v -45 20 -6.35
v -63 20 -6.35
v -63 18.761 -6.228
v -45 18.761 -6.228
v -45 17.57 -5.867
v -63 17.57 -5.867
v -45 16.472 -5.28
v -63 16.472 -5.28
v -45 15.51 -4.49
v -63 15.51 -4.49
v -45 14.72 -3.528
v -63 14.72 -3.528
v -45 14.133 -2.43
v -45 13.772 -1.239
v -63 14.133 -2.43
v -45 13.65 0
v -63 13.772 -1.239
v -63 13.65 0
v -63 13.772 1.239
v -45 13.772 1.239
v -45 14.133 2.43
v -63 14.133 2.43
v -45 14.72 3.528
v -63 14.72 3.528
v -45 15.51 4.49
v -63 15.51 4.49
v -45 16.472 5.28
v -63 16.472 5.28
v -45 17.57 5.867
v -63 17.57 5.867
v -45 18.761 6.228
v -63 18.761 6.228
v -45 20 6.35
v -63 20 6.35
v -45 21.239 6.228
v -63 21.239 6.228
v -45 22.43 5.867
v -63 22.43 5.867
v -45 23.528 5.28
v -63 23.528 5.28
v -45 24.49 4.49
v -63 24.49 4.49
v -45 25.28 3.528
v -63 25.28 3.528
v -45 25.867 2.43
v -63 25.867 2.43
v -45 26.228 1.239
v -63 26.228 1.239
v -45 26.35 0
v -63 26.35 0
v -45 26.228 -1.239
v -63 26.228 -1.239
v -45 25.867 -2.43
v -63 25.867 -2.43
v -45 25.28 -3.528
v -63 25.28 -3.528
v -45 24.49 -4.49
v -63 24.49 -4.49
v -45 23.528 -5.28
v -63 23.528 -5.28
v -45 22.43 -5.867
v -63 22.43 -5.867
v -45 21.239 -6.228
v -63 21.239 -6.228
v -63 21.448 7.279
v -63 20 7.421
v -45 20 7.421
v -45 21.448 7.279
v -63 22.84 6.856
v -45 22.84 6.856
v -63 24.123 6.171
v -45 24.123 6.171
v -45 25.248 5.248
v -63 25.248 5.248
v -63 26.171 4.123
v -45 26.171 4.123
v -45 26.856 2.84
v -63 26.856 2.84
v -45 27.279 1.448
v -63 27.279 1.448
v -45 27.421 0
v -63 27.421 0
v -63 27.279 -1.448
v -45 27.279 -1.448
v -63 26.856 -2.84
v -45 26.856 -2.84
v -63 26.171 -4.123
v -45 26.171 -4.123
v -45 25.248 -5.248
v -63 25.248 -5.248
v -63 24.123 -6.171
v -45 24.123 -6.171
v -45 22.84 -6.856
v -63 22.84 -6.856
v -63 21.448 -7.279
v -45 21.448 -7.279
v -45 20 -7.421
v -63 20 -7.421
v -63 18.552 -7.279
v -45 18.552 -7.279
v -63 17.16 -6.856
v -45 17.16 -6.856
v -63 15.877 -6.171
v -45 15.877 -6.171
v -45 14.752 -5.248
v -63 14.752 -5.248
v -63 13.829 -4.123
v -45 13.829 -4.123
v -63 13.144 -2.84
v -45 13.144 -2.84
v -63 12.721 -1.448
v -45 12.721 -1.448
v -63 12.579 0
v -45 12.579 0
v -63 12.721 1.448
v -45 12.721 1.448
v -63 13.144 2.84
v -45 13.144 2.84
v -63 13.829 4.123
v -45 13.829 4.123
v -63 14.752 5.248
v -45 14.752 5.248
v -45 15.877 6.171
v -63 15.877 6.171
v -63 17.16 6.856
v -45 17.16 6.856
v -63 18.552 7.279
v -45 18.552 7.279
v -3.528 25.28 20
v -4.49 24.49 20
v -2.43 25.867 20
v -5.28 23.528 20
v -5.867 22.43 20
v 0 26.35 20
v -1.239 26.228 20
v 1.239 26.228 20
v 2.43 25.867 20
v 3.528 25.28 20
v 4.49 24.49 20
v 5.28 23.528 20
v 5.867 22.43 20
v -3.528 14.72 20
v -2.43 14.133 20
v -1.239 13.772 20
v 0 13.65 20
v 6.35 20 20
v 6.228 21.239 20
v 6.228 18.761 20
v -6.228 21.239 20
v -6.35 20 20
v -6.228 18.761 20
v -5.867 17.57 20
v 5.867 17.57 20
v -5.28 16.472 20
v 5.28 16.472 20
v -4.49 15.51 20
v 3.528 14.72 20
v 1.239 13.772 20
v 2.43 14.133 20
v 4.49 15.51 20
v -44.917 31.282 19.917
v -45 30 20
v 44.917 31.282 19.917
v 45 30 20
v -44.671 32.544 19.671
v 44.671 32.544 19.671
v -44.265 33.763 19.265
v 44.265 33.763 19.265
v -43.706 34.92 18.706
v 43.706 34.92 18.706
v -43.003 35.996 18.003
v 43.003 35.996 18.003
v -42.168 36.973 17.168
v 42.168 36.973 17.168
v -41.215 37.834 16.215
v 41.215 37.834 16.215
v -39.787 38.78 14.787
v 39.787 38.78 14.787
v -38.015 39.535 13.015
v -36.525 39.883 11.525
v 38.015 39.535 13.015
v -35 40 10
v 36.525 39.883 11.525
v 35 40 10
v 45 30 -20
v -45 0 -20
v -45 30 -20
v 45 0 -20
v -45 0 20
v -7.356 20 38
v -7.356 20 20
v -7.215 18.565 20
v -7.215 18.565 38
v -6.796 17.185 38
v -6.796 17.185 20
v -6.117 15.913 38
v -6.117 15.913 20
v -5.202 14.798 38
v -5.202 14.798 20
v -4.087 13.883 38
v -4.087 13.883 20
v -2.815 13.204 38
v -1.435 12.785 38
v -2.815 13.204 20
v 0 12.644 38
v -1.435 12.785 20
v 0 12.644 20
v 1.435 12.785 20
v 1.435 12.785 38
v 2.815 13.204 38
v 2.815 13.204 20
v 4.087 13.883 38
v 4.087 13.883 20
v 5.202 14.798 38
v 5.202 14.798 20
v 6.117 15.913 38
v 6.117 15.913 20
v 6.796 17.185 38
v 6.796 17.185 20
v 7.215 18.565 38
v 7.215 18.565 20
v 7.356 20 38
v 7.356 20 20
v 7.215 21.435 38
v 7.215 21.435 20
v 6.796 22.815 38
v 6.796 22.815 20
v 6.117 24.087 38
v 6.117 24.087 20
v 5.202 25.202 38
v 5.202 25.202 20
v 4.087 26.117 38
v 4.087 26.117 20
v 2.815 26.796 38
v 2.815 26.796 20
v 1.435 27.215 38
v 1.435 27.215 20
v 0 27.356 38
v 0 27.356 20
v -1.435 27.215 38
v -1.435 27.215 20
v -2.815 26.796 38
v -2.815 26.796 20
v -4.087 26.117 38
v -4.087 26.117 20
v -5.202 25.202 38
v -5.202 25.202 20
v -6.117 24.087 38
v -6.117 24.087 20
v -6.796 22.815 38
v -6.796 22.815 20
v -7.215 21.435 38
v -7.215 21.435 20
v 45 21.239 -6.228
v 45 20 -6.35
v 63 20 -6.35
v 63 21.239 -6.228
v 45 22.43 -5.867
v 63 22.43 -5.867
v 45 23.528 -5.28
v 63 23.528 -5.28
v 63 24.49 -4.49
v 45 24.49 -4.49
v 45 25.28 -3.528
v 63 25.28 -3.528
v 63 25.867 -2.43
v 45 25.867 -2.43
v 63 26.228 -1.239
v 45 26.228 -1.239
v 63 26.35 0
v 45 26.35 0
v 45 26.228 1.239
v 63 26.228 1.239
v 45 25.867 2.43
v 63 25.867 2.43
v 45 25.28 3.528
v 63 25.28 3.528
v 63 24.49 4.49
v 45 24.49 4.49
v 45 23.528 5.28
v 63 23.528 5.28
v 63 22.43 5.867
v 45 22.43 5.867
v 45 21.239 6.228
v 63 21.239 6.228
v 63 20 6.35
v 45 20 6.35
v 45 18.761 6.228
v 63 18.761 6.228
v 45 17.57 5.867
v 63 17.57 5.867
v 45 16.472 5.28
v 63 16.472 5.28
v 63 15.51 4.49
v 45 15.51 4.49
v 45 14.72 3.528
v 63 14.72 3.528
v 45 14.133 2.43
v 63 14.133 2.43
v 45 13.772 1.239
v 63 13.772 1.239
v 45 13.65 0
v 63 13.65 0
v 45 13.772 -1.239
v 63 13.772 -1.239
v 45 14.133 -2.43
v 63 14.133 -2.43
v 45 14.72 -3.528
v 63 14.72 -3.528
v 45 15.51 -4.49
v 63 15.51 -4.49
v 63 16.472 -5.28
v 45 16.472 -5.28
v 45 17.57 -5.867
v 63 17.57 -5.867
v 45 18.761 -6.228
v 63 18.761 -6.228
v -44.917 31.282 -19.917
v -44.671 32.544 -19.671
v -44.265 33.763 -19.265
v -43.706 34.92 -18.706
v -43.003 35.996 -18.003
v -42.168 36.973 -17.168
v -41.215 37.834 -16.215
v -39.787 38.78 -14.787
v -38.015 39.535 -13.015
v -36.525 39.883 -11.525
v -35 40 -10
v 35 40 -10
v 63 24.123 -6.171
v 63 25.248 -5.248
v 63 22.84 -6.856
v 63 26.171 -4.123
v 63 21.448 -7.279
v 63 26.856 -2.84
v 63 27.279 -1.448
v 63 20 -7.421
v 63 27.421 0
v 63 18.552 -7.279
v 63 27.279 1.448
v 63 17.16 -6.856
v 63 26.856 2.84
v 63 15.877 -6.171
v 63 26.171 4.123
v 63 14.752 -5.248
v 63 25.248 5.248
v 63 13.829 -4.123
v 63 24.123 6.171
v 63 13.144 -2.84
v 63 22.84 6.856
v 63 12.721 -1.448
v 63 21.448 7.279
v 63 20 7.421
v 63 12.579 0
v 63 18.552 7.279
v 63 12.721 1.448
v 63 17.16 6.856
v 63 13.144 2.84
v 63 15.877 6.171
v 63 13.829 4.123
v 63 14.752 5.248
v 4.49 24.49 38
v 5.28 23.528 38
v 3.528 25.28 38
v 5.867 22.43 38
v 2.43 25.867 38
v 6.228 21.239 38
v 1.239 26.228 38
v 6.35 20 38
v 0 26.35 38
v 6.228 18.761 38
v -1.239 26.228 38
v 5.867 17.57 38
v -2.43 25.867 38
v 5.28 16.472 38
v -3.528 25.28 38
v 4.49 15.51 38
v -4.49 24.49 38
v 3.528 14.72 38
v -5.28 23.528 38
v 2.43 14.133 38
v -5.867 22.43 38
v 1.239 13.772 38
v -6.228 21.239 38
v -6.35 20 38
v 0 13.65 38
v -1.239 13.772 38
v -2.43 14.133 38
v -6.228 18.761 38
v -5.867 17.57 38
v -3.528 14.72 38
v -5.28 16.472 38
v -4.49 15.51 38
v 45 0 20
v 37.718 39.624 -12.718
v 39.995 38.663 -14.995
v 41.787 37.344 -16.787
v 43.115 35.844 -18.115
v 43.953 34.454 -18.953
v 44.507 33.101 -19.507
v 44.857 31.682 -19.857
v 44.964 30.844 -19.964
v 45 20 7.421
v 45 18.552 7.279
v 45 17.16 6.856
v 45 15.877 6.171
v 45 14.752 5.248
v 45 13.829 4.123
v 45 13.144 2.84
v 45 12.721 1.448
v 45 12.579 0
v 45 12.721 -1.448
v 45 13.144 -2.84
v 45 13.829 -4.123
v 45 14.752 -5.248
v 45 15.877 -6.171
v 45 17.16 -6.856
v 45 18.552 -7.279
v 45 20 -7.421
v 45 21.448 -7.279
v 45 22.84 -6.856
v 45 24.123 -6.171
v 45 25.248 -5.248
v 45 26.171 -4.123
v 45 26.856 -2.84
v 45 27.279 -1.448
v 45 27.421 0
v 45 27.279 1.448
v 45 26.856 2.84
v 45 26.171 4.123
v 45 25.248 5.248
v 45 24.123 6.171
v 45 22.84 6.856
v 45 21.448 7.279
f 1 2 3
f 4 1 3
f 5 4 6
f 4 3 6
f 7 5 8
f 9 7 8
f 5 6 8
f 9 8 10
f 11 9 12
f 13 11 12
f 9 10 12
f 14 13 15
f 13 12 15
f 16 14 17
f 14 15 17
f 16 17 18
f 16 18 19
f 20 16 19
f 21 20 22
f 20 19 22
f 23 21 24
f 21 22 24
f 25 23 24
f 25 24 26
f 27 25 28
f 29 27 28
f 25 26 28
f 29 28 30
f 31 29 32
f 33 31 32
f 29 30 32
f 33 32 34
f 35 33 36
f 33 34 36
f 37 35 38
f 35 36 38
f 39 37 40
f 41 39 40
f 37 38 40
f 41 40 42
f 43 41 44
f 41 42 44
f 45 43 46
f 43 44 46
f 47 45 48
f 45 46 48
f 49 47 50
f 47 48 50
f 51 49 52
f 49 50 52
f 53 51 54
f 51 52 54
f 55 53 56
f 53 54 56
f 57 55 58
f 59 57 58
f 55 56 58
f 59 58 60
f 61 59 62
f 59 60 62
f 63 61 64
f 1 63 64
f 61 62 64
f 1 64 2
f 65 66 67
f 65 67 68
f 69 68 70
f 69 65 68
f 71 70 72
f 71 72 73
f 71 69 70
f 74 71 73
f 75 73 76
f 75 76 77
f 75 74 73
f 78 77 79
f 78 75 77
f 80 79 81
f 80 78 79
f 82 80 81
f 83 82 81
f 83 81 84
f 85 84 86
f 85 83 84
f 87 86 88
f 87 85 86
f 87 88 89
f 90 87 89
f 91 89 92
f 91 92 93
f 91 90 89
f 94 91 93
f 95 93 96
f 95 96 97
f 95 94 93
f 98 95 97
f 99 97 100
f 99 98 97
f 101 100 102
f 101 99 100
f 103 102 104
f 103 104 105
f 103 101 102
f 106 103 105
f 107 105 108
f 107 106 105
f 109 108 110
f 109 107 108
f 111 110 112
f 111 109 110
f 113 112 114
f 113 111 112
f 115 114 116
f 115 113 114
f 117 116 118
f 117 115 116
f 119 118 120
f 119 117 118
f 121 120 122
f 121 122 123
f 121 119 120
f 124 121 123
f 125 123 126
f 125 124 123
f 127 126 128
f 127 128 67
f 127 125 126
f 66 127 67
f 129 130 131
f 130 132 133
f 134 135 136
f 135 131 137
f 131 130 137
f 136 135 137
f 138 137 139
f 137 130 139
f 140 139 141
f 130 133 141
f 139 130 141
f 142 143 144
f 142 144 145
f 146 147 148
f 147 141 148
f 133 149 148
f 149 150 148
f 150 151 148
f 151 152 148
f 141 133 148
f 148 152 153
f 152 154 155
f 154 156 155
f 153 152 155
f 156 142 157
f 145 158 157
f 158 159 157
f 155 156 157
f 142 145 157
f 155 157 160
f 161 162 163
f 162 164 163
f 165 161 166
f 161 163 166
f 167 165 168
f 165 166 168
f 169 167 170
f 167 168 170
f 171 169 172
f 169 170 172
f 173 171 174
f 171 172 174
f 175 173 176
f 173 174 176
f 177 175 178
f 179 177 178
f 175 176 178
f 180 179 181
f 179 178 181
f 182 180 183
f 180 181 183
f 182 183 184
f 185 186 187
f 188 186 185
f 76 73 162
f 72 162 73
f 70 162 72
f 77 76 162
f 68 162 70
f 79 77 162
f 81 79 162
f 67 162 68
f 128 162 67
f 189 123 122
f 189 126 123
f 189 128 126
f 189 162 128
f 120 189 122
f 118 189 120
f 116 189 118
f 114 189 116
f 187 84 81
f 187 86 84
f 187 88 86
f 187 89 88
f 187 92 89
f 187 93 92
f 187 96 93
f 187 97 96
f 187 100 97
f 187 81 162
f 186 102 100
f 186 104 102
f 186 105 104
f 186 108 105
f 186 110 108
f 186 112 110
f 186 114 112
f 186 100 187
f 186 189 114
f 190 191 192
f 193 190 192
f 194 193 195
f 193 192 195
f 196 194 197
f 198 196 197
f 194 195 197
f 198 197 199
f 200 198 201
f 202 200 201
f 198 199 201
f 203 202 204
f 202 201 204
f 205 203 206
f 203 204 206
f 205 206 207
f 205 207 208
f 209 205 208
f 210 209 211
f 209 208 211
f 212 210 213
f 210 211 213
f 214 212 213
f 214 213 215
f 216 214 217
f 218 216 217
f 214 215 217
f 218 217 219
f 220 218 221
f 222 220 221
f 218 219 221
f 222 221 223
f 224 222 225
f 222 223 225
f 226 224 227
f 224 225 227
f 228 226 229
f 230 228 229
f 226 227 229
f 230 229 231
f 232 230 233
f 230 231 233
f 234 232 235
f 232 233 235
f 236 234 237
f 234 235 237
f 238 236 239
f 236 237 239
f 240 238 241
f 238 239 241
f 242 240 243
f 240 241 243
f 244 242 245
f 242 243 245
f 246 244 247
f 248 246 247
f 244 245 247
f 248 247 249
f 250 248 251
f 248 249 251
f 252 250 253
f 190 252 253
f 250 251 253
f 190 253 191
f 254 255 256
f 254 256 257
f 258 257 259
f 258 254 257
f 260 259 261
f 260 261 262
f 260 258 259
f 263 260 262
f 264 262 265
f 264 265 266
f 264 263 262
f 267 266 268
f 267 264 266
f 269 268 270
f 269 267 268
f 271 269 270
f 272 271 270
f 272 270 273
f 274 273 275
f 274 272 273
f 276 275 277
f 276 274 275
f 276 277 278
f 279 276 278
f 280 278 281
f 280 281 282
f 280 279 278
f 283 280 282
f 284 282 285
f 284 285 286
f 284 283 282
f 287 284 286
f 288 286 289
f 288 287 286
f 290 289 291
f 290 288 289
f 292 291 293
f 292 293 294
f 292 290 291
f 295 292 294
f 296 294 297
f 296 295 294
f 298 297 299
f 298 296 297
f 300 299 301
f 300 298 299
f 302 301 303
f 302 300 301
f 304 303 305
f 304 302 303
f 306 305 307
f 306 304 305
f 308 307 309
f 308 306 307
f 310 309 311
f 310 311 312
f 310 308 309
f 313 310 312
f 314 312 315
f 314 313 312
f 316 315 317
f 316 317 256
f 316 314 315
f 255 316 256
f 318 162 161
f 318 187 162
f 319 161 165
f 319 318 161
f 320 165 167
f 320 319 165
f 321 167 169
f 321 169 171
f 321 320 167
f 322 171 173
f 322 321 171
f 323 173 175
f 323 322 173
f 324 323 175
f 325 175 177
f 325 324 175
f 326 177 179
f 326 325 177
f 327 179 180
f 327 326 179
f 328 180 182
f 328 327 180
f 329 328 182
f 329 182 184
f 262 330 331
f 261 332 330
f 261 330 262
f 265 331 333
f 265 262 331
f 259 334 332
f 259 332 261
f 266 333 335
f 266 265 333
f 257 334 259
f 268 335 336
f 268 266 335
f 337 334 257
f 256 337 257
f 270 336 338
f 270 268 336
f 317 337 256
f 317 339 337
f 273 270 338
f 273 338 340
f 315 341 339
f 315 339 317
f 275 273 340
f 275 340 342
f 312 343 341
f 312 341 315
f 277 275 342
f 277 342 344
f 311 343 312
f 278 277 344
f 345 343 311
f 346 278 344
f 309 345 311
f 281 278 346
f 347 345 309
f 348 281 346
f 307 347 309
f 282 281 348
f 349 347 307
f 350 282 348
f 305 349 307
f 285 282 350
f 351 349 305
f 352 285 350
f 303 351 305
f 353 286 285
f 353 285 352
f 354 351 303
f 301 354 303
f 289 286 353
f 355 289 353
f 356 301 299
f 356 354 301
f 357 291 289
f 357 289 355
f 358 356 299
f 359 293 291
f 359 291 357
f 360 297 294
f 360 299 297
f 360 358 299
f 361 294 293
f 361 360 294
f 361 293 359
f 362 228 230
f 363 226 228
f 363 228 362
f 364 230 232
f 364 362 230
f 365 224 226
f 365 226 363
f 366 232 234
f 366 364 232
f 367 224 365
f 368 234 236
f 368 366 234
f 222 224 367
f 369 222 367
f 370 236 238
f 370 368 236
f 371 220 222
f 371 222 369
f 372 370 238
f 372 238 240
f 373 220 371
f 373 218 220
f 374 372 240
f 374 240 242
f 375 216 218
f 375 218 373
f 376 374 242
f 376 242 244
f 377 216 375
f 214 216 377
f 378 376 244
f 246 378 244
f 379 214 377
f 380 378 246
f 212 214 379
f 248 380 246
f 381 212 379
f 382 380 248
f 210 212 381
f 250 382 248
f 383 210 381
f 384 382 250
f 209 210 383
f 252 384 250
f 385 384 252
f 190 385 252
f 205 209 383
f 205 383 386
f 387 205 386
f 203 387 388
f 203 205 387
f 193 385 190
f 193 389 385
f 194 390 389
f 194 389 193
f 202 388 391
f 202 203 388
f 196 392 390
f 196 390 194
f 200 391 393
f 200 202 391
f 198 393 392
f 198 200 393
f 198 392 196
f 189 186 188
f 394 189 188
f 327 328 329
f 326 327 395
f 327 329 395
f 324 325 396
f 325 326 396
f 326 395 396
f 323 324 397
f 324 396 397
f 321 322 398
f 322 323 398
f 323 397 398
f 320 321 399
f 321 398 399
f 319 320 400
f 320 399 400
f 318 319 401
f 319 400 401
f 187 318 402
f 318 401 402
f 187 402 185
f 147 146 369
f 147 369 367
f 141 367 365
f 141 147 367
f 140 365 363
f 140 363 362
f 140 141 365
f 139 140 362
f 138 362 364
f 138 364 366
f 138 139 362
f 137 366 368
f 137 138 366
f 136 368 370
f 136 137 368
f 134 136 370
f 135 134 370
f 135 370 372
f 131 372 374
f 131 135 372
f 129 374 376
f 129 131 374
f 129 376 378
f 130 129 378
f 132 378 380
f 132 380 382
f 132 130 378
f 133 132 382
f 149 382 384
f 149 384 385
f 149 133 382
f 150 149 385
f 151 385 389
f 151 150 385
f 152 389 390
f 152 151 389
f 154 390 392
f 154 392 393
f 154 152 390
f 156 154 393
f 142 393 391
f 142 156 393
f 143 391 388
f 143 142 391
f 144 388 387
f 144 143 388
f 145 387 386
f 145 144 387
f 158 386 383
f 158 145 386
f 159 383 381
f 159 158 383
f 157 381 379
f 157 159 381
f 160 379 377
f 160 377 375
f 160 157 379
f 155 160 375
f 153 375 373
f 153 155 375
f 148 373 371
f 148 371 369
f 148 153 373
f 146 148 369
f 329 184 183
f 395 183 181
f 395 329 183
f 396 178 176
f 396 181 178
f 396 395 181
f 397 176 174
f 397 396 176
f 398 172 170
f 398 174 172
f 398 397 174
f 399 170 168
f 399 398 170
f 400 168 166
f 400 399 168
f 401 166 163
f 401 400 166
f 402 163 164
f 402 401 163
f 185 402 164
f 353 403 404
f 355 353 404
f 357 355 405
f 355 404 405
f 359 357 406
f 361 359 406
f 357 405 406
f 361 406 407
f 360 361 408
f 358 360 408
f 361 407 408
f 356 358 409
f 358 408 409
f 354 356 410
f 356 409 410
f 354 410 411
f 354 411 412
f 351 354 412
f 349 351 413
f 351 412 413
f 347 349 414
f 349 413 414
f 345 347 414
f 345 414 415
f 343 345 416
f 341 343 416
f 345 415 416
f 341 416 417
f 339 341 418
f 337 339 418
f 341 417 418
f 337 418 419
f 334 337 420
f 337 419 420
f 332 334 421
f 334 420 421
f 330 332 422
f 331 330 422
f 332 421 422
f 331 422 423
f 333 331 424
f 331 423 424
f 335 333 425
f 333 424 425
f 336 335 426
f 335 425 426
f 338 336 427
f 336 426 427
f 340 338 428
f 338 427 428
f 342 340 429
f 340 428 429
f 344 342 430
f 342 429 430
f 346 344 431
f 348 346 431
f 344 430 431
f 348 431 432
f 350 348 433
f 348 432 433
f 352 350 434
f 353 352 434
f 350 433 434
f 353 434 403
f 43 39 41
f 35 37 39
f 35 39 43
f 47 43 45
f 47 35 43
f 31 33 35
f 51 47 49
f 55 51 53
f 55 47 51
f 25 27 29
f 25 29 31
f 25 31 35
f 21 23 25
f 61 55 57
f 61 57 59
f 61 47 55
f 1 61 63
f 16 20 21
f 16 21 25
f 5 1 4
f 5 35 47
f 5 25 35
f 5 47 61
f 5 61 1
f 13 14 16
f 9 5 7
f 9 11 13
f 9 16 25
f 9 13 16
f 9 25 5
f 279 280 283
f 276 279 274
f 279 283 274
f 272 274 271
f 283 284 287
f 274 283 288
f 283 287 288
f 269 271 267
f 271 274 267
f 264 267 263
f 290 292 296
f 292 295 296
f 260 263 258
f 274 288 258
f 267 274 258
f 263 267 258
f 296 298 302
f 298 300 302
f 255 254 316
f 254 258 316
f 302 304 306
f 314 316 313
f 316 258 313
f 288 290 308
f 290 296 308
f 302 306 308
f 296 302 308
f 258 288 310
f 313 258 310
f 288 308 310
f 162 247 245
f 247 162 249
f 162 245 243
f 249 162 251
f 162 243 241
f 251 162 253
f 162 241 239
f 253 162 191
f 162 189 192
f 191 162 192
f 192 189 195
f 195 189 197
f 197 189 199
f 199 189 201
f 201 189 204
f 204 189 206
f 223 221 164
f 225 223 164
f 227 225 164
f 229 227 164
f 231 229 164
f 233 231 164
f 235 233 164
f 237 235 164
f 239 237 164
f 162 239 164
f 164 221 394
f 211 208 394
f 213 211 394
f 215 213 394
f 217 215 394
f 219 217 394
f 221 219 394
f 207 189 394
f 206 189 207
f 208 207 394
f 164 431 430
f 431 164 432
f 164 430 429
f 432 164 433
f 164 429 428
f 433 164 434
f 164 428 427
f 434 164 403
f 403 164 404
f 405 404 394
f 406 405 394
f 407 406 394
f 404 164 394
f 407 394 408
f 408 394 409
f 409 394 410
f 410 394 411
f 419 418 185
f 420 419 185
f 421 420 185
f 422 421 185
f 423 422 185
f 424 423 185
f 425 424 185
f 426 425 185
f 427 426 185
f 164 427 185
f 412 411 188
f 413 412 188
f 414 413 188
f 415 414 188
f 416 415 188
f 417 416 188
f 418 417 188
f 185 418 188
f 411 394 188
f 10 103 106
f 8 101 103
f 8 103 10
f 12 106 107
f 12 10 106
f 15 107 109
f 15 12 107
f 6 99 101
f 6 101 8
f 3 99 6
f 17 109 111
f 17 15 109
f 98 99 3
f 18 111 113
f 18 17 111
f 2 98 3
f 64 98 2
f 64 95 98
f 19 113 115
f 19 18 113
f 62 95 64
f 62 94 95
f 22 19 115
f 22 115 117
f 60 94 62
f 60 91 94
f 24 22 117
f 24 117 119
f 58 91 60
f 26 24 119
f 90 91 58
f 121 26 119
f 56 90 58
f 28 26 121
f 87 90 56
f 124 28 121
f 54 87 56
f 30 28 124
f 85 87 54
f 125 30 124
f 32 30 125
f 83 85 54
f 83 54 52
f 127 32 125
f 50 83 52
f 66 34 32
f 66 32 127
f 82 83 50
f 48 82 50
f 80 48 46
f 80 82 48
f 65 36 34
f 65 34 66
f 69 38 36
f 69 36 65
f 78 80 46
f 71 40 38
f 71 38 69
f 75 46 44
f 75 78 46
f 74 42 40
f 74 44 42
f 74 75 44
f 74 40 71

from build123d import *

# Parameters (mm, degrees)
CROQUIS1_W              = 90
CROQUIS1_H              = 40
SALIENTE_EXTRUIR1_DEPTH = 40
CROQUIS2_R              = 7.421380831
CROQUIS2_R_2            = 6.35
SALIENTE_EXTRUIR2_DEPTH = 18
SALIENTE_EXTRUIR3_START = 18
CROQUIS3_R              = 7.421380831
CROQUIS3_R_2            = 6.35
SALIENTE_EXTRUIR3_DEPTH = 18
CROQUIS4_R              = 7.356347307
CROQUIS4_R_2            = 6.35
SALIENTE_EXTRUIR4_DEPTH = 18
REDONDEO1_R             = 10


with BuildPart() as part:
    # Croquis1 → Saliente-Extruir1 (new body)
    with BuildSketch(Plane(origin=(0, 0, 0), x_dir=(1, 0, 0), z_dir=(0, 1, 0))):
        Rectangle(CROQUIS1_W, CROQUIS1_H)
    extrude(amount=SALIENTE_EXTRUIR1_DEPTH)

    # Croquis2 → Saliente-Extruir2 (add)
    with BuildSketch(Plane(origin=(45, 0, 0), x_dir=(0, 0, -1), z_dir=(1, 0, 0))):
        with Locations(Location((0, 20, 0), (0, 0, 180))):
            Circle(CROQUIS2_R)
        with Locations((0, 20)):
            Circle(CROQUIS2_R_2, mode=Mode.SUBTRACT)
    extrude(amount=SALIENTE_EXTRUIR2_DEPTH)

    # Croquis3 → Saliente-Extruir3 (add)
    with BuildSketch(Plane.ZY.offset(45).offset(SALIENTE_EXTRUIR3_START)):
        with Locations((0, 20)):
            Circle(CROQUIS3_R)
        with Locations(Location((0, 20, 0), (0, 0, 180))):
            Circle(CROQUIS3_R_2, mode=Mode.SUBTRACT)
    extrude(amount=-SALIENTE_EXTRUIR3_DEPTH)

    # Croquis4 → Saliente-Extruir4 (add)
    with BuildSketch(Plane.XY.offset(20)):
        with Locations(Location((0, 20, 0), (0, 0, 180))):
            Circle(CROQUIS4_R)
        with Locations((0, 20)):
            Circle(CROQUIS4_R_2, mode=Mode.SUBTRACT)
    extrude(amount=SALIENTE_EXTRUIR4_DEPTH)

    # Redondeo1
    redondeo1_edges = [part.edges().sort_by_distance(p)[0] for p in [
        (-45, 40, 0),
        (0, 40, 20),
        (45, 40, 0),
        (0, 40, -20),
    ]]
    fillet(redondeo1_edges, radius=REDONDEO1_R)


solid = part.part
